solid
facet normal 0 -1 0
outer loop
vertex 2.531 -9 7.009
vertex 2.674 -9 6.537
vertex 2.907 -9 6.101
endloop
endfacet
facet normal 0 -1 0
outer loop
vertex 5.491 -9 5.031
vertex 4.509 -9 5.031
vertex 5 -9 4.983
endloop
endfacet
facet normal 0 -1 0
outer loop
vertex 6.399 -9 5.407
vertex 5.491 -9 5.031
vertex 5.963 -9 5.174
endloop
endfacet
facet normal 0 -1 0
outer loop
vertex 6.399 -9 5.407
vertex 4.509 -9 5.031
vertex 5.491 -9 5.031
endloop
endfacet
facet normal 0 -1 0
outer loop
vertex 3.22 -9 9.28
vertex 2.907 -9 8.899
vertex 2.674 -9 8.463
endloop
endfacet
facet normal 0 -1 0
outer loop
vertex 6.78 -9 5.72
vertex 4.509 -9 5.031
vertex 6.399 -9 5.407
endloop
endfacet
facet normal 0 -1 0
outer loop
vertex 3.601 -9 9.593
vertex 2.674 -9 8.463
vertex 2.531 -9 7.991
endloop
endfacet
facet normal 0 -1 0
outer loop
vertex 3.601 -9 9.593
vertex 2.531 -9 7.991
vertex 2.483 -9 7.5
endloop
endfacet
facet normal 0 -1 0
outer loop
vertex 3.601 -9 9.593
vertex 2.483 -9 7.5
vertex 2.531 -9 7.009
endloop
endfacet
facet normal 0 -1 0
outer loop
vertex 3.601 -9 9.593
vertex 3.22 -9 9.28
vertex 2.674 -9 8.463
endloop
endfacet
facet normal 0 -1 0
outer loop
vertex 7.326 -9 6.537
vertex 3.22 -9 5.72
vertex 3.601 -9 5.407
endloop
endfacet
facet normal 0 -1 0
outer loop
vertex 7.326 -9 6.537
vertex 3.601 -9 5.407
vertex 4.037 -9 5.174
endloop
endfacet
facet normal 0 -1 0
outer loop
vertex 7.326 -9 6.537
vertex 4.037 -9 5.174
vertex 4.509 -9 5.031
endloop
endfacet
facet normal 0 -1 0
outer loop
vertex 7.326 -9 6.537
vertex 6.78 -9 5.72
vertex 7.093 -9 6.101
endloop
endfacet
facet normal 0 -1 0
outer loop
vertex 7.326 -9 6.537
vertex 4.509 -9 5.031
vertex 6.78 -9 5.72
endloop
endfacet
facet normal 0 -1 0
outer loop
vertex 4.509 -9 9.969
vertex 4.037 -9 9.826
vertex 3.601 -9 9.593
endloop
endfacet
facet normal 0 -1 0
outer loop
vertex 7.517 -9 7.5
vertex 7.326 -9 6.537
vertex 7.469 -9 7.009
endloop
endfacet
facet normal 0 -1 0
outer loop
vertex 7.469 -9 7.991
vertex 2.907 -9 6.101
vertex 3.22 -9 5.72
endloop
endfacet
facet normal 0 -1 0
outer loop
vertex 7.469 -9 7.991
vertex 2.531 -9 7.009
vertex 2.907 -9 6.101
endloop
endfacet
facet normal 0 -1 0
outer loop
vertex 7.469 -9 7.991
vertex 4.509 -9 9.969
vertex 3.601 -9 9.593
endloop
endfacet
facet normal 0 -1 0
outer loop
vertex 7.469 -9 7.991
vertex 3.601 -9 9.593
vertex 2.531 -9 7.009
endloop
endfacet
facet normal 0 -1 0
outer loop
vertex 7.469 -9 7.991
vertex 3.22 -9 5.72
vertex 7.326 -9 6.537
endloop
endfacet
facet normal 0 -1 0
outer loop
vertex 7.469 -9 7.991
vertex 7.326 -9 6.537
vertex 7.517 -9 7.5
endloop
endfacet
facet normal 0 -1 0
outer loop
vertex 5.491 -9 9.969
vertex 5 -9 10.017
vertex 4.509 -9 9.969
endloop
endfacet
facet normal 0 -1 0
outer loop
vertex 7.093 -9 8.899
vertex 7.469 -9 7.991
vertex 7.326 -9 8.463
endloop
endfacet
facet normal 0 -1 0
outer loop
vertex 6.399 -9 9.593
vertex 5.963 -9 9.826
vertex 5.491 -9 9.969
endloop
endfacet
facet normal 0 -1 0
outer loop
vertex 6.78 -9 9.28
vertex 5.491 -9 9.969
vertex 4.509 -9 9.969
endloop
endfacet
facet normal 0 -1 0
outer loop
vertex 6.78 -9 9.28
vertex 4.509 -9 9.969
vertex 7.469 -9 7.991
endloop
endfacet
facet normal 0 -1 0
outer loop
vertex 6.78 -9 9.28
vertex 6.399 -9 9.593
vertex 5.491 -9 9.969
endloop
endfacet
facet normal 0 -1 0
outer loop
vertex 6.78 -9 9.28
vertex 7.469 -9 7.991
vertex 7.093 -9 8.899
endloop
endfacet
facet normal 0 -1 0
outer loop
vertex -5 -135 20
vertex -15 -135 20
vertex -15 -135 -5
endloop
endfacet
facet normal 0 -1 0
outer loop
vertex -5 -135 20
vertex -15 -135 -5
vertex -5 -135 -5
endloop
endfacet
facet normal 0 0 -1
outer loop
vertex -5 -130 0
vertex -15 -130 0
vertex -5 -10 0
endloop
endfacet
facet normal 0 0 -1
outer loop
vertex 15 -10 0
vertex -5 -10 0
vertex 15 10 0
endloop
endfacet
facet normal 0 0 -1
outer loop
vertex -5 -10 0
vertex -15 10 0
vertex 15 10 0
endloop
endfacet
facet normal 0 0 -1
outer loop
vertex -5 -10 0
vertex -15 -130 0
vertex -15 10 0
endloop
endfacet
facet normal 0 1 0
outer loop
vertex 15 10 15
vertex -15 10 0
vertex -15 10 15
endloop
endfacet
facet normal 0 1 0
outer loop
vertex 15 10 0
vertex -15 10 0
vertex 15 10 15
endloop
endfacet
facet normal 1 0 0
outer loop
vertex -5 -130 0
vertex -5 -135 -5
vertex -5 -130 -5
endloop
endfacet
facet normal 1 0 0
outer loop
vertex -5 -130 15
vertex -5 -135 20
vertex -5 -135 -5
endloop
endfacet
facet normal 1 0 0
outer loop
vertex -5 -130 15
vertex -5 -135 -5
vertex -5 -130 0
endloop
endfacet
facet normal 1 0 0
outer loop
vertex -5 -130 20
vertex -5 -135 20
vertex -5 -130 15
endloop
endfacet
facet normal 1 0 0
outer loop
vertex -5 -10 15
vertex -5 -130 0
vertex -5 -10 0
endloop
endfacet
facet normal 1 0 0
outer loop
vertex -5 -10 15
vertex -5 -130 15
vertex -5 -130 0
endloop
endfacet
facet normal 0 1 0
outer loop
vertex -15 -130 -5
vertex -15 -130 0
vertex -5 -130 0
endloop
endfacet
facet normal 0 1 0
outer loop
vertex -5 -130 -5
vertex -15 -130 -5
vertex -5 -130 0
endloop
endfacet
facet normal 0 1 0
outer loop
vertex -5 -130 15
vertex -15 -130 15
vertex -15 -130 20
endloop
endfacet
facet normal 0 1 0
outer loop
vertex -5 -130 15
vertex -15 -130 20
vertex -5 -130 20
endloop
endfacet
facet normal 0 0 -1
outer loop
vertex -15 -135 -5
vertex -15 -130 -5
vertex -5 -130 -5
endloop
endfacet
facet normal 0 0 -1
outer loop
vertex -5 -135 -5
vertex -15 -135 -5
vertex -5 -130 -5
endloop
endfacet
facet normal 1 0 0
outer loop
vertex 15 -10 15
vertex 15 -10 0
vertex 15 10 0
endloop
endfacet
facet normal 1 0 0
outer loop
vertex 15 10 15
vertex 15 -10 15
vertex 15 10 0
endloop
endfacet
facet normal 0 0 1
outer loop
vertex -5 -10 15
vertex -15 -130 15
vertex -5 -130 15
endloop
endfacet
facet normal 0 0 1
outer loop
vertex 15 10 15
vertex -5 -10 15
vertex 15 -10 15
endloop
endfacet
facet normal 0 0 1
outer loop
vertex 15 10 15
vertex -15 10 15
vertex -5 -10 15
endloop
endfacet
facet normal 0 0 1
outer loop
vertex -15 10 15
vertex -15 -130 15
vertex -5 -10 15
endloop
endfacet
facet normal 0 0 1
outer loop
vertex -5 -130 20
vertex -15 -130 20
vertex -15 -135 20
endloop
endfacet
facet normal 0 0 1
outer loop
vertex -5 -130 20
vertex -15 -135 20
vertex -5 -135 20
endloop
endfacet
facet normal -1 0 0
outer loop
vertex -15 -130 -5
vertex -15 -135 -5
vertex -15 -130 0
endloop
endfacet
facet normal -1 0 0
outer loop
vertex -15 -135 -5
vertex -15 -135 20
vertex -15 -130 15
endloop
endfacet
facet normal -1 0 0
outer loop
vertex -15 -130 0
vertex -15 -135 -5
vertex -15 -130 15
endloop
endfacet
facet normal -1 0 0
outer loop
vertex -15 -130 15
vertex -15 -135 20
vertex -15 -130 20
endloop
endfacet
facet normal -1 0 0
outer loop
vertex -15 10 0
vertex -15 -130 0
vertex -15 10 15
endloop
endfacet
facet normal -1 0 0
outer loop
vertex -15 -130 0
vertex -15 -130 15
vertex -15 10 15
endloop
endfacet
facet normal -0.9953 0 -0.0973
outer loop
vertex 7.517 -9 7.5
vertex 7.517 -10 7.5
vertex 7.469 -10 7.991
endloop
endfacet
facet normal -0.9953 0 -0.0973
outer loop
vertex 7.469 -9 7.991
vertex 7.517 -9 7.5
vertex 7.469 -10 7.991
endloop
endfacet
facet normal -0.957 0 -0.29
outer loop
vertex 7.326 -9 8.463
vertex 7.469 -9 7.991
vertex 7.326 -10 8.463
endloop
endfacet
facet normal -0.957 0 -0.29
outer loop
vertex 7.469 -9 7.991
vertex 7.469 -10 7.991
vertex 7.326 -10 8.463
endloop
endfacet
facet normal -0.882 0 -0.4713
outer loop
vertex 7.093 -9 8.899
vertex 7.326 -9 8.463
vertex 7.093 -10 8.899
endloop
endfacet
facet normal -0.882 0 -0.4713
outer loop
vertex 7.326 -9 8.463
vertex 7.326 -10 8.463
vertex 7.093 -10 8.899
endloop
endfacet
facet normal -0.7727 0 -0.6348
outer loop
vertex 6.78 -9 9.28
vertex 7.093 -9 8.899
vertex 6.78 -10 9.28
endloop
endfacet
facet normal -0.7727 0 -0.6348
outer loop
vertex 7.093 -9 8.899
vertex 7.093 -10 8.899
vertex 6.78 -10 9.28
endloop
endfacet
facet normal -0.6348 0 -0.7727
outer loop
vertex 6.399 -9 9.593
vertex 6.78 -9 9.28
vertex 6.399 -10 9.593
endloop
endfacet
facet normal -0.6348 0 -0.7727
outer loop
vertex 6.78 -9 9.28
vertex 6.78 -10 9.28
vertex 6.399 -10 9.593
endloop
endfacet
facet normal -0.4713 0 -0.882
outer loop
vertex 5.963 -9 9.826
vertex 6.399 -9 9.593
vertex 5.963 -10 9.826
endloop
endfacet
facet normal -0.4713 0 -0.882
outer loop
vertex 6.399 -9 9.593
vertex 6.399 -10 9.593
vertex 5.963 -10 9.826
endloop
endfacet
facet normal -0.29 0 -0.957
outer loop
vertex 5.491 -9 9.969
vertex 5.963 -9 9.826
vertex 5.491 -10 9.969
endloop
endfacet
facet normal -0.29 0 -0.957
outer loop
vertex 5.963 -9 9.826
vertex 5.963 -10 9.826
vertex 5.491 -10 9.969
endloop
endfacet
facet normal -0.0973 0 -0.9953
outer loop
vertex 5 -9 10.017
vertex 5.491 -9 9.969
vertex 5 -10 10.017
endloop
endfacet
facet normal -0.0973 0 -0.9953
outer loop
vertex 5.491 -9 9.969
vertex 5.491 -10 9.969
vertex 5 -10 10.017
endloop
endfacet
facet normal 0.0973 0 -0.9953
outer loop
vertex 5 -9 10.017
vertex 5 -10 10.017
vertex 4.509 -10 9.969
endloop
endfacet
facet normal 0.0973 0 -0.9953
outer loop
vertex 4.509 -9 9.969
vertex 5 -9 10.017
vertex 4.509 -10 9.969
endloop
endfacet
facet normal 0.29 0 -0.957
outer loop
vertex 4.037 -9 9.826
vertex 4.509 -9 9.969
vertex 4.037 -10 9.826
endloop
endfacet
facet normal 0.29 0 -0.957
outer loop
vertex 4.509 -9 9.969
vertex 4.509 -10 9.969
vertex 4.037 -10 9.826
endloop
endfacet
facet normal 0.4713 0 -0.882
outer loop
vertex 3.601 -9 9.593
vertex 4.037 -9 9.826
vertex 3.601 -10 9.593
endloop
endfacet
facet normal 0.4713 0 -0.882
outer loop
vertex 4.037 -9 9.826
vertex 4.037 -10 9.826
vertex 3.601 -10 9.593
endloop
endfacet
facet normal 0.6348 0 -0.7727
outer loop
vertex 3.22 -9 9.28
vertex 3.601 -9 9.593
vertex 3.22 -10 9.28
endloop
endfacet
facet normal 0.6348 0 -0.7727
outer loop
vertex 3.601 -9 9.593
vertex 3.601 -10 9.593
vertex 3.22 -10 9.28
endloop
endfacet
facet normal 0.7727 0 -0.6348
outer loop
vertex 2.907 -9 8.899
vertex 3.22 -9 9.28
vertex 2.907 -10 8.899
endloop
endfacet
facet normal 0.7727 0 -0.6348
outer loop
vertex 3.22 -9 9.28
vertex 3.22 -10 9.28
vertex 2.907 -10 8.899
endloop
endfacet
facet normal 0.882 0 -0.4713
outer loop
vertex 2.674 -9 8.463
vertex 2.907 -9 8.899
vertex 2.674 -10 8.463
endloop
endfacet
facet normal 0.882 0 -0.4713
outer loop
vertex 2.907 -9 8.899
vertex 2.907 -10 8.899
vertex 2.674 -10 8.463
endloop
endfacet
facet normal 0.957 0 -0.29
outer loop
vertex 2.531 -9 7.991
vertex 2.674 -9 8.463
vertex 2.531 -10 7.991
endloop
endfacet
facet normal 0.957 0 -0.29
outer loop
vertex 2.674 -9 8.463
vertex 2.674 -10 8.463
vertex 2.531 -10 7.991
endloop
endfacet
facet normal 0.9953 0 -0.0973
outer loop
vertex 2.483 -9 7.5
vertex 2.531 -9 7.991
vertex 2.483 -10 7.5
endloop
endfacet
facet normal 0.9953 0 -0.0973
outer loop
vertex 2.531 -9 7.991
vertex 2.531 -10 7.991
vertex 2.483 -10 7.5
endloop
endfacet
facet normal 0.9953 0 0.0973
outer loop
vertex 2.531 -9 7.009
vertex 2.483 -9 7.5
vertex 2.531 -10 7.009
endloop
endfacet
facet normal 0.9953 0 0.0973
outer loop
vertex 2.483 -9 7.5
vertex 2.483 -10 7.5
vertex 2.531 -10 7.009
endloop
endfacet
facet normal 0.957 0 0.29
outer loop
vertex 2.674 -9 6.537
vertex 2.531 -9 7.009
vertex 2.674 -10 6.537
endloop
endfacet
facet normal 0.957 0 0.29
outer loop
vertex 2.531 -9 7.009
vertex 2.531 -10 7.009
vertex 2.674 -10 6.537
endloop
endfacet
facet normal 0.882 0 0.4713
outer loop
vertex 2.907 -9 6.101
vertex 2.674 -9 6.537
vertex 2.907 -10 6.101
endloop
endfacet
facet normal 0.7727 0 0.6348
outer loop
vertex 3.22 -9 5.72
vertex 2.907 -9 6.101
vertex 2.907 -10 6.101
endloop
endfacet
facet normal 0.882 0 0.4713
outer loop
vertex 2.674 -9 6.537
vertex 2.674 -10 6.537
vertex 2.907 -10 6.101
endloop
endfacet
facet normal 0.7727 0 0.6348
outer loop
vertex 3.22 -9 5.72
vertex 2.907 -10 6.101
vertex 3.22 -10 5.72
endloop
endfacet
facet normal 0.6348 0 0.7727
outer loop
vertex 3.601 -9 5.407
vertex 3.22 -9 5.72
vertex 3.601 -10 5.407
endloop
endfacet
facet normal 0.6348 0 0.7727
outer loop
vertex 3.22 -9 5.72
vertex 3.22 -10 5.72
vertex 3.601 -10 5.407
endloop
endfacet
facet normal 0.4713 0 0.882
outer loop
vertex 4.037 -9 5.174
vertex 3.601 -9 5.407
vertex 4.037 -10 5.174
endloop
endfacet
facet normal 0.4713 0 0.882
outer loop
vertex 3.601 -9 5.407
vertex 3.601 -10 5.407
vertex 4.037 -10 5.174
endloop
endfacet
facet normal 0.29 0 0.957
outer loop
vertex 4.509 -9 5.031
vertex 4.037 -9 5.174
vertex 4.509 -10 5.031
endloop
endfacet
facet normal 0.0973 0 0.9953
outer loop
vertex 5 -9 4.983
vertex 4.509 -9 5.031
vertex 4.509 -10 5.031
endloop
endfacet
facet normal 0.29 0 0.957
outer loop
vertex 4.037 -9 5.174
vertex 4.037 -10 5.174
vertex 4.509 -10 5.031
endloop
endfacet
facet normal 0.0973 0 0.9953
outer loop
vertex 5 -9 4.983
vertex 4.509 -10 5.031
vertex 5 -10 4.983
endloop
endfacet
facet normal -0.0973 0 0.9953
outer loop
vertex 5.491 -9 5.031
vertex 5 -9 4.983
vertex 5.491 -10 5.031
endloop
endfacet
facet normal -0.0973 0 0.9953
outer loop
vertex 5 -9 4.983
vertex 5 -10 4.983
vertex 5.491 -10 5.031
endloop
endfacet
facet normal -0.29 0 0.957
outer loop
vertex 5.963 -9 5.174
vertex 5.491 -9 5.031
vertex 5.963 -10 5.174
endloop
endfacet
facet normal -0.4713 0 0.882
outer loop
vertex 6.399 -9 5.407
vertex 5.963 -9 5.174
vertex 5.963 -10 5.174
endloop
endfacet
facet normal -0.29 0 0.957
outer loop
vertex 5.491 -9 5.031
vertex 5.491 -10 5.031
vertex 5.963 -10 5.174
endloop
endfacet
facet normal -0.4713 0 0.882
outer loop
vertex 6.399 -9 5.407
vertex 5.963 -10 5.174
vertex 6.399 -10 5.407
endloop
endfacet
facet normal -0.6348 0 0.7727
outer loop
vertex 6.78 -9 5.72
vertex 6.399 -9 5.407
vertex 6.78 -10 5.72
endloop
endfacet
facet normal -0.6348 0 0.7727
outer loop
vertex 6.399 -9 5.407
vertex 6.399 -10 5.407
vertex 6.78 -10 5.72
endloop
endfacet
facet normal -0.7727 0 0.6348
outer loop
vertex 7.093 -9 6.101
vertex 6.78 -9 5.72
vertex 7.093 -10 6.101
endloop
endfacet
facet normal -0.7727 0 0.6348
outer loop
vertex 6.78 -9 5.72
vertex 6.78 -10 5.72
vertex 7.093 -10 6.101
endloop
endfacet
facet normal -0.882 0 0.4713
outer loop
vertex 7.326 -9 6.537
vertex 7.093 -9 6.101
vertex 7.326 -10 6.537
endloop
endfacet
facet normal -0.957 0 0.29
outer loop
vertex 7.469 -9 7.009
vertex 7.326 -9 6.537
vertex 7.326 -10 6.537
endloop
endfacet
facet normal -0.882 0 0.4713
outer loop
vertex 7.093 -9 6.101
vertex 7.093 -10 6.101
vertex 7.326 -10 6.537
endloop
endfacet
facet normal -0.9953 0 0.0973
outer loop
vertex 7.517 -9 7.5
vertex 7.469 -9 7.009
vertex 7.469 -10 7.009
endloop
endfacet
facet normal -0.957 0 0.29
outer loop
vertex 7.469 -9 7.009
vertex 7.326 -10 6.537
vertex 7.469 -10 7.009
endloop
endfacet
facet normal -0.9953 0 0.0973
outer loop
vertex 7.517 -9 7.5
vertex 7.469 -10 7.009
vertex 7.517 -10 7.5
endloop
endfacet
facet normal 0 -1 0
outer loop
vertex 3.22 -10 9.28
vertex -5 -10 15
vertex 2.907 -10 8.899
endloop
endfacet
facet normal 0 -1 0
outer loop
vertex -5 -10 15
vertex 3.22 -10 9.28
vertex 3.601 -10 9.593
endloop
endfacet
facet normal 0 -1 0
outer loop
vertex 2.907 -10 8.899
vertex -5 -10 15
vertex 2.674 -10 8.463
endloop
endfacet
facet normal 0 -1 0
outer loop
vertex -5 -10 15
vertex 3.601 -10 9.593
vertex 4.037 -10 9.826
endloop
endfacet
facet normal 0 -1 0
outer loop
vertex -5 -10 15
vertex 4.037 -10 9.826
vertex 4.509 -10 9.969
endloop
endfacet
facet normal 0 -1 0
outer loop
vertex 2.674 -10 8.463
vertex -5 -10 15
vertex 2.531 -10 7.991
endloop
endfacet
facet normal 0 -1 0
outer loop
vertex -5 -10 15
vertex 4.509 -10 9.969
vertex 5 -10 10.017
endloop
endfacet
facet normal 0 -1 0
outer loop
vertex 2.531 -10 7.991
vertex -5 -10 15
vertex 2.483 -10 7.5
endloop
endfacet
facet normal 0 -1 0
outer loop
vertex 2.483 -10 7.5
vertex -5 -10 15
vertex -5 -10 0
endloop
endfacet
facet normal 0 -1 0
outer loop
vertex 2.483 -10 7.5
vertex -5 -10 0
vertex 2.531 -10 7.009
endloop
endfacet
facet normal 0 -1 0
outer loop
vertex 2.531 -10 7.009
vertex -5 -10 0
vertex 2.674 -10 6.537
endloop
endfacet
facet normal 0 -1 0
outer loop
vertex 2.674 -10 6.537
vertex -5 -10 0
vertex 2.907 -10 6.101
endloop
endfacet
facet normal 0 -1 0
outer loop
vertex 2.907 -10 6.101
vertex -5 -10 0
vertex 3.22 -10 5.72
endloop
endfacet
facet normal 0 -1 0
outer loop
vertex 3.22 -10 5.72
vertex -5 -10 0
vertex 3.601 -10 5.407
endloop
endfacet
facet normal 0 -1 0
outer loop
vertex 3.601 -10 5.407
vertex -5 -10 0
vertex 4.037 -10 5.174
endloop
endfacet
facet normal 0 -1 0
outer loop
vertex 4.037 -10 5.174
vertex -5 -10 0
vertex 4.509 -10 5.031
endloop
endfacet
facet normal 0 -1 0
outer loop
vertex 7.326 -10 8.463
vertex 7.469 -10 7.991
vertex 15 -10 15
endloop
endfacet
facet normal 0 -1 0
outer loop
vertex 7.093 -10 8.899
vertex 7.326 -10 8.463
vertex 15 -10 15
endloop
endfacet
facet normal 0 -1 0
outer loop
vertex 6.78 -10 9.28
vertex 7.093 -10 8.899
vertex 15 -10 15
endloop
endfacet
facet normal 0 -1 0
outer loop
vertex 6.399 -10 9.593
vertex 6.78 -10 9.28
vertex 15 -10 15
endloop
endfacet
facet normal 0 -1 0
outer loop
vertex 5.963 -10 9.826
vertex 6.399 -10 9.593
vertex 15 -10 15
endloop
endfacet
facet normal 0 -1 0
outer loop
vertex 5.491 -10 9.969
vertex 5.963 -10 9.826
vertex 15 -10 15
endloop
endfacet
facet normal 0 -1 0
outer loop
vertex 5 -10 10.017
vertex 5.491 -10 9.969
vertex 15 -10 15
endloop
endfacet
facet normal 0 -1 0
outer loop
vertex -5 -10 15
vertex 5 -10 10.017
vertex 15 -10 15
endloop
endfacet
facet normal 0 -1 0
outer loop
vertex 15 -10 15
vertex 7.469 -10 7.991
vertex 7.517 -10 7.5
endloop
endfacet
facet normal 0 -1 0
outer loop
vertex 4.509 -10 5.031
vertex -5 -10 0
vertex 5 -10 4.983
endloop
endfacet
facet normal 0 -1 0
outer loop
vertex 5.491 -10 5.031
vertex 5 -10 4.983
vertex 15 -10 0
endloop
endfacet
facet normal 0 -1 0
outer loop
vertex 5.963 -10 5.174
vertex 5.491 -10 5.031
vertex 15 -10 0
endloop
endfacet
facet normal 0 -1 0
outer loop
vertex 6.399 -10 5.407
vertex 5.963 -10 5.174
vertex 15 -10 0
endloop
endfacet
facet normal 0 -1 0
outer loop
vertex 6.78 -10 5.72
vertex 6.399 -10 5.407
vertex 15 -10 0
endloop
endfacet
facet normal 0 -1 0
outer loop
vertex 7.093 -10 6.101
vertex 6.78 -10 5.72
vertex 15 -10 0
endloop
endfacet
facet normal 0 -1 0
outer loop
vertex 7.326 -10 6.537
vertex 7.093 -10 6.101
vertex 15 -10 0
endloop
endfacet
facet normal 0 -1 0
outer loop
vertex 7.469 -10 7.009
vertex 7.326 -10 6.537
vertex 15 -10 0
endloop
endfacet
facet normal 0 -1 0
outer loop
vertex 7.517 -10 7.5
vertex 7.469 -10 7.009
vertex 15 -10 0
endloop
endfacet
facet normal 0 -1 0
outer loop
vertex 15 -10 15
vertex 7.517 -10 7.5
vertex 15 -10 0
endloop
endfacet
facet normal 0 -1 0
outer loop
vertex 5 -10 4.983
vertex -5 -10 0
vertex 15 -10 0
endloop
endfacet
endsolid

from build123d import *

# Parameters (mm, degrees)
SKETCH2_W                = 30
SKETCH2_H                = 20
SKETCH2_W_2              = 10
SKETCH2_H_2              = 120
BOSS_EXTRUDE1_DEPTH      = 15
SKETCH3_W                = 10
SKETCH3_H                = 5
BOSS_EXTRUDE2_DEPTH      = 5
BOSS_EXTRUDE2_DEPTH_BACK = 20
SKETCH5_R                = 2.517277228
CUT_EXTRUDE1_DEPTH       = 1


with BuildPart() as part:
    # Sketch2 → Boss-Extrude1 (new body)
    with BuildSketch(Plane.XY):
        Rectangle(SKETCH2_W, SKETCH2_H)
        with Locations((-10, -70)):
            Rectangle(SKETCH2_W_2, SKETCH2_H_2)
    extrude(amount=BOSS_EXTRUDE1_DEPTH)

    # Sketch3 → Boss-Extrude2 (add, two sides)
    with BuildSketch(Plane.XY.offset(15)) as boss_extrude2_sk:
        with Locations((-10, -132.5)):
            Rectangle(SKETCH3_W, SKETCH3_H)
    extrude(amount=BOSS_EXTRUDE2_DEPTH)
    extrude(boss_extrude2_sk.sketch, amount=-BOSS_EXTRUDE2_DEPTH_BACK)

    # Sketch5 → Cut-Extrude1 (cut)
    with BuildSketch(Plane.XZ.offset(10)):
        with Locations((5, 7.5)):
            Circle(SKETCH5_R)
    extrude(amount=-CUT_EXTRUDE1_DEPTH, mode=Mode.SUBTRACT)


solid = part.part
